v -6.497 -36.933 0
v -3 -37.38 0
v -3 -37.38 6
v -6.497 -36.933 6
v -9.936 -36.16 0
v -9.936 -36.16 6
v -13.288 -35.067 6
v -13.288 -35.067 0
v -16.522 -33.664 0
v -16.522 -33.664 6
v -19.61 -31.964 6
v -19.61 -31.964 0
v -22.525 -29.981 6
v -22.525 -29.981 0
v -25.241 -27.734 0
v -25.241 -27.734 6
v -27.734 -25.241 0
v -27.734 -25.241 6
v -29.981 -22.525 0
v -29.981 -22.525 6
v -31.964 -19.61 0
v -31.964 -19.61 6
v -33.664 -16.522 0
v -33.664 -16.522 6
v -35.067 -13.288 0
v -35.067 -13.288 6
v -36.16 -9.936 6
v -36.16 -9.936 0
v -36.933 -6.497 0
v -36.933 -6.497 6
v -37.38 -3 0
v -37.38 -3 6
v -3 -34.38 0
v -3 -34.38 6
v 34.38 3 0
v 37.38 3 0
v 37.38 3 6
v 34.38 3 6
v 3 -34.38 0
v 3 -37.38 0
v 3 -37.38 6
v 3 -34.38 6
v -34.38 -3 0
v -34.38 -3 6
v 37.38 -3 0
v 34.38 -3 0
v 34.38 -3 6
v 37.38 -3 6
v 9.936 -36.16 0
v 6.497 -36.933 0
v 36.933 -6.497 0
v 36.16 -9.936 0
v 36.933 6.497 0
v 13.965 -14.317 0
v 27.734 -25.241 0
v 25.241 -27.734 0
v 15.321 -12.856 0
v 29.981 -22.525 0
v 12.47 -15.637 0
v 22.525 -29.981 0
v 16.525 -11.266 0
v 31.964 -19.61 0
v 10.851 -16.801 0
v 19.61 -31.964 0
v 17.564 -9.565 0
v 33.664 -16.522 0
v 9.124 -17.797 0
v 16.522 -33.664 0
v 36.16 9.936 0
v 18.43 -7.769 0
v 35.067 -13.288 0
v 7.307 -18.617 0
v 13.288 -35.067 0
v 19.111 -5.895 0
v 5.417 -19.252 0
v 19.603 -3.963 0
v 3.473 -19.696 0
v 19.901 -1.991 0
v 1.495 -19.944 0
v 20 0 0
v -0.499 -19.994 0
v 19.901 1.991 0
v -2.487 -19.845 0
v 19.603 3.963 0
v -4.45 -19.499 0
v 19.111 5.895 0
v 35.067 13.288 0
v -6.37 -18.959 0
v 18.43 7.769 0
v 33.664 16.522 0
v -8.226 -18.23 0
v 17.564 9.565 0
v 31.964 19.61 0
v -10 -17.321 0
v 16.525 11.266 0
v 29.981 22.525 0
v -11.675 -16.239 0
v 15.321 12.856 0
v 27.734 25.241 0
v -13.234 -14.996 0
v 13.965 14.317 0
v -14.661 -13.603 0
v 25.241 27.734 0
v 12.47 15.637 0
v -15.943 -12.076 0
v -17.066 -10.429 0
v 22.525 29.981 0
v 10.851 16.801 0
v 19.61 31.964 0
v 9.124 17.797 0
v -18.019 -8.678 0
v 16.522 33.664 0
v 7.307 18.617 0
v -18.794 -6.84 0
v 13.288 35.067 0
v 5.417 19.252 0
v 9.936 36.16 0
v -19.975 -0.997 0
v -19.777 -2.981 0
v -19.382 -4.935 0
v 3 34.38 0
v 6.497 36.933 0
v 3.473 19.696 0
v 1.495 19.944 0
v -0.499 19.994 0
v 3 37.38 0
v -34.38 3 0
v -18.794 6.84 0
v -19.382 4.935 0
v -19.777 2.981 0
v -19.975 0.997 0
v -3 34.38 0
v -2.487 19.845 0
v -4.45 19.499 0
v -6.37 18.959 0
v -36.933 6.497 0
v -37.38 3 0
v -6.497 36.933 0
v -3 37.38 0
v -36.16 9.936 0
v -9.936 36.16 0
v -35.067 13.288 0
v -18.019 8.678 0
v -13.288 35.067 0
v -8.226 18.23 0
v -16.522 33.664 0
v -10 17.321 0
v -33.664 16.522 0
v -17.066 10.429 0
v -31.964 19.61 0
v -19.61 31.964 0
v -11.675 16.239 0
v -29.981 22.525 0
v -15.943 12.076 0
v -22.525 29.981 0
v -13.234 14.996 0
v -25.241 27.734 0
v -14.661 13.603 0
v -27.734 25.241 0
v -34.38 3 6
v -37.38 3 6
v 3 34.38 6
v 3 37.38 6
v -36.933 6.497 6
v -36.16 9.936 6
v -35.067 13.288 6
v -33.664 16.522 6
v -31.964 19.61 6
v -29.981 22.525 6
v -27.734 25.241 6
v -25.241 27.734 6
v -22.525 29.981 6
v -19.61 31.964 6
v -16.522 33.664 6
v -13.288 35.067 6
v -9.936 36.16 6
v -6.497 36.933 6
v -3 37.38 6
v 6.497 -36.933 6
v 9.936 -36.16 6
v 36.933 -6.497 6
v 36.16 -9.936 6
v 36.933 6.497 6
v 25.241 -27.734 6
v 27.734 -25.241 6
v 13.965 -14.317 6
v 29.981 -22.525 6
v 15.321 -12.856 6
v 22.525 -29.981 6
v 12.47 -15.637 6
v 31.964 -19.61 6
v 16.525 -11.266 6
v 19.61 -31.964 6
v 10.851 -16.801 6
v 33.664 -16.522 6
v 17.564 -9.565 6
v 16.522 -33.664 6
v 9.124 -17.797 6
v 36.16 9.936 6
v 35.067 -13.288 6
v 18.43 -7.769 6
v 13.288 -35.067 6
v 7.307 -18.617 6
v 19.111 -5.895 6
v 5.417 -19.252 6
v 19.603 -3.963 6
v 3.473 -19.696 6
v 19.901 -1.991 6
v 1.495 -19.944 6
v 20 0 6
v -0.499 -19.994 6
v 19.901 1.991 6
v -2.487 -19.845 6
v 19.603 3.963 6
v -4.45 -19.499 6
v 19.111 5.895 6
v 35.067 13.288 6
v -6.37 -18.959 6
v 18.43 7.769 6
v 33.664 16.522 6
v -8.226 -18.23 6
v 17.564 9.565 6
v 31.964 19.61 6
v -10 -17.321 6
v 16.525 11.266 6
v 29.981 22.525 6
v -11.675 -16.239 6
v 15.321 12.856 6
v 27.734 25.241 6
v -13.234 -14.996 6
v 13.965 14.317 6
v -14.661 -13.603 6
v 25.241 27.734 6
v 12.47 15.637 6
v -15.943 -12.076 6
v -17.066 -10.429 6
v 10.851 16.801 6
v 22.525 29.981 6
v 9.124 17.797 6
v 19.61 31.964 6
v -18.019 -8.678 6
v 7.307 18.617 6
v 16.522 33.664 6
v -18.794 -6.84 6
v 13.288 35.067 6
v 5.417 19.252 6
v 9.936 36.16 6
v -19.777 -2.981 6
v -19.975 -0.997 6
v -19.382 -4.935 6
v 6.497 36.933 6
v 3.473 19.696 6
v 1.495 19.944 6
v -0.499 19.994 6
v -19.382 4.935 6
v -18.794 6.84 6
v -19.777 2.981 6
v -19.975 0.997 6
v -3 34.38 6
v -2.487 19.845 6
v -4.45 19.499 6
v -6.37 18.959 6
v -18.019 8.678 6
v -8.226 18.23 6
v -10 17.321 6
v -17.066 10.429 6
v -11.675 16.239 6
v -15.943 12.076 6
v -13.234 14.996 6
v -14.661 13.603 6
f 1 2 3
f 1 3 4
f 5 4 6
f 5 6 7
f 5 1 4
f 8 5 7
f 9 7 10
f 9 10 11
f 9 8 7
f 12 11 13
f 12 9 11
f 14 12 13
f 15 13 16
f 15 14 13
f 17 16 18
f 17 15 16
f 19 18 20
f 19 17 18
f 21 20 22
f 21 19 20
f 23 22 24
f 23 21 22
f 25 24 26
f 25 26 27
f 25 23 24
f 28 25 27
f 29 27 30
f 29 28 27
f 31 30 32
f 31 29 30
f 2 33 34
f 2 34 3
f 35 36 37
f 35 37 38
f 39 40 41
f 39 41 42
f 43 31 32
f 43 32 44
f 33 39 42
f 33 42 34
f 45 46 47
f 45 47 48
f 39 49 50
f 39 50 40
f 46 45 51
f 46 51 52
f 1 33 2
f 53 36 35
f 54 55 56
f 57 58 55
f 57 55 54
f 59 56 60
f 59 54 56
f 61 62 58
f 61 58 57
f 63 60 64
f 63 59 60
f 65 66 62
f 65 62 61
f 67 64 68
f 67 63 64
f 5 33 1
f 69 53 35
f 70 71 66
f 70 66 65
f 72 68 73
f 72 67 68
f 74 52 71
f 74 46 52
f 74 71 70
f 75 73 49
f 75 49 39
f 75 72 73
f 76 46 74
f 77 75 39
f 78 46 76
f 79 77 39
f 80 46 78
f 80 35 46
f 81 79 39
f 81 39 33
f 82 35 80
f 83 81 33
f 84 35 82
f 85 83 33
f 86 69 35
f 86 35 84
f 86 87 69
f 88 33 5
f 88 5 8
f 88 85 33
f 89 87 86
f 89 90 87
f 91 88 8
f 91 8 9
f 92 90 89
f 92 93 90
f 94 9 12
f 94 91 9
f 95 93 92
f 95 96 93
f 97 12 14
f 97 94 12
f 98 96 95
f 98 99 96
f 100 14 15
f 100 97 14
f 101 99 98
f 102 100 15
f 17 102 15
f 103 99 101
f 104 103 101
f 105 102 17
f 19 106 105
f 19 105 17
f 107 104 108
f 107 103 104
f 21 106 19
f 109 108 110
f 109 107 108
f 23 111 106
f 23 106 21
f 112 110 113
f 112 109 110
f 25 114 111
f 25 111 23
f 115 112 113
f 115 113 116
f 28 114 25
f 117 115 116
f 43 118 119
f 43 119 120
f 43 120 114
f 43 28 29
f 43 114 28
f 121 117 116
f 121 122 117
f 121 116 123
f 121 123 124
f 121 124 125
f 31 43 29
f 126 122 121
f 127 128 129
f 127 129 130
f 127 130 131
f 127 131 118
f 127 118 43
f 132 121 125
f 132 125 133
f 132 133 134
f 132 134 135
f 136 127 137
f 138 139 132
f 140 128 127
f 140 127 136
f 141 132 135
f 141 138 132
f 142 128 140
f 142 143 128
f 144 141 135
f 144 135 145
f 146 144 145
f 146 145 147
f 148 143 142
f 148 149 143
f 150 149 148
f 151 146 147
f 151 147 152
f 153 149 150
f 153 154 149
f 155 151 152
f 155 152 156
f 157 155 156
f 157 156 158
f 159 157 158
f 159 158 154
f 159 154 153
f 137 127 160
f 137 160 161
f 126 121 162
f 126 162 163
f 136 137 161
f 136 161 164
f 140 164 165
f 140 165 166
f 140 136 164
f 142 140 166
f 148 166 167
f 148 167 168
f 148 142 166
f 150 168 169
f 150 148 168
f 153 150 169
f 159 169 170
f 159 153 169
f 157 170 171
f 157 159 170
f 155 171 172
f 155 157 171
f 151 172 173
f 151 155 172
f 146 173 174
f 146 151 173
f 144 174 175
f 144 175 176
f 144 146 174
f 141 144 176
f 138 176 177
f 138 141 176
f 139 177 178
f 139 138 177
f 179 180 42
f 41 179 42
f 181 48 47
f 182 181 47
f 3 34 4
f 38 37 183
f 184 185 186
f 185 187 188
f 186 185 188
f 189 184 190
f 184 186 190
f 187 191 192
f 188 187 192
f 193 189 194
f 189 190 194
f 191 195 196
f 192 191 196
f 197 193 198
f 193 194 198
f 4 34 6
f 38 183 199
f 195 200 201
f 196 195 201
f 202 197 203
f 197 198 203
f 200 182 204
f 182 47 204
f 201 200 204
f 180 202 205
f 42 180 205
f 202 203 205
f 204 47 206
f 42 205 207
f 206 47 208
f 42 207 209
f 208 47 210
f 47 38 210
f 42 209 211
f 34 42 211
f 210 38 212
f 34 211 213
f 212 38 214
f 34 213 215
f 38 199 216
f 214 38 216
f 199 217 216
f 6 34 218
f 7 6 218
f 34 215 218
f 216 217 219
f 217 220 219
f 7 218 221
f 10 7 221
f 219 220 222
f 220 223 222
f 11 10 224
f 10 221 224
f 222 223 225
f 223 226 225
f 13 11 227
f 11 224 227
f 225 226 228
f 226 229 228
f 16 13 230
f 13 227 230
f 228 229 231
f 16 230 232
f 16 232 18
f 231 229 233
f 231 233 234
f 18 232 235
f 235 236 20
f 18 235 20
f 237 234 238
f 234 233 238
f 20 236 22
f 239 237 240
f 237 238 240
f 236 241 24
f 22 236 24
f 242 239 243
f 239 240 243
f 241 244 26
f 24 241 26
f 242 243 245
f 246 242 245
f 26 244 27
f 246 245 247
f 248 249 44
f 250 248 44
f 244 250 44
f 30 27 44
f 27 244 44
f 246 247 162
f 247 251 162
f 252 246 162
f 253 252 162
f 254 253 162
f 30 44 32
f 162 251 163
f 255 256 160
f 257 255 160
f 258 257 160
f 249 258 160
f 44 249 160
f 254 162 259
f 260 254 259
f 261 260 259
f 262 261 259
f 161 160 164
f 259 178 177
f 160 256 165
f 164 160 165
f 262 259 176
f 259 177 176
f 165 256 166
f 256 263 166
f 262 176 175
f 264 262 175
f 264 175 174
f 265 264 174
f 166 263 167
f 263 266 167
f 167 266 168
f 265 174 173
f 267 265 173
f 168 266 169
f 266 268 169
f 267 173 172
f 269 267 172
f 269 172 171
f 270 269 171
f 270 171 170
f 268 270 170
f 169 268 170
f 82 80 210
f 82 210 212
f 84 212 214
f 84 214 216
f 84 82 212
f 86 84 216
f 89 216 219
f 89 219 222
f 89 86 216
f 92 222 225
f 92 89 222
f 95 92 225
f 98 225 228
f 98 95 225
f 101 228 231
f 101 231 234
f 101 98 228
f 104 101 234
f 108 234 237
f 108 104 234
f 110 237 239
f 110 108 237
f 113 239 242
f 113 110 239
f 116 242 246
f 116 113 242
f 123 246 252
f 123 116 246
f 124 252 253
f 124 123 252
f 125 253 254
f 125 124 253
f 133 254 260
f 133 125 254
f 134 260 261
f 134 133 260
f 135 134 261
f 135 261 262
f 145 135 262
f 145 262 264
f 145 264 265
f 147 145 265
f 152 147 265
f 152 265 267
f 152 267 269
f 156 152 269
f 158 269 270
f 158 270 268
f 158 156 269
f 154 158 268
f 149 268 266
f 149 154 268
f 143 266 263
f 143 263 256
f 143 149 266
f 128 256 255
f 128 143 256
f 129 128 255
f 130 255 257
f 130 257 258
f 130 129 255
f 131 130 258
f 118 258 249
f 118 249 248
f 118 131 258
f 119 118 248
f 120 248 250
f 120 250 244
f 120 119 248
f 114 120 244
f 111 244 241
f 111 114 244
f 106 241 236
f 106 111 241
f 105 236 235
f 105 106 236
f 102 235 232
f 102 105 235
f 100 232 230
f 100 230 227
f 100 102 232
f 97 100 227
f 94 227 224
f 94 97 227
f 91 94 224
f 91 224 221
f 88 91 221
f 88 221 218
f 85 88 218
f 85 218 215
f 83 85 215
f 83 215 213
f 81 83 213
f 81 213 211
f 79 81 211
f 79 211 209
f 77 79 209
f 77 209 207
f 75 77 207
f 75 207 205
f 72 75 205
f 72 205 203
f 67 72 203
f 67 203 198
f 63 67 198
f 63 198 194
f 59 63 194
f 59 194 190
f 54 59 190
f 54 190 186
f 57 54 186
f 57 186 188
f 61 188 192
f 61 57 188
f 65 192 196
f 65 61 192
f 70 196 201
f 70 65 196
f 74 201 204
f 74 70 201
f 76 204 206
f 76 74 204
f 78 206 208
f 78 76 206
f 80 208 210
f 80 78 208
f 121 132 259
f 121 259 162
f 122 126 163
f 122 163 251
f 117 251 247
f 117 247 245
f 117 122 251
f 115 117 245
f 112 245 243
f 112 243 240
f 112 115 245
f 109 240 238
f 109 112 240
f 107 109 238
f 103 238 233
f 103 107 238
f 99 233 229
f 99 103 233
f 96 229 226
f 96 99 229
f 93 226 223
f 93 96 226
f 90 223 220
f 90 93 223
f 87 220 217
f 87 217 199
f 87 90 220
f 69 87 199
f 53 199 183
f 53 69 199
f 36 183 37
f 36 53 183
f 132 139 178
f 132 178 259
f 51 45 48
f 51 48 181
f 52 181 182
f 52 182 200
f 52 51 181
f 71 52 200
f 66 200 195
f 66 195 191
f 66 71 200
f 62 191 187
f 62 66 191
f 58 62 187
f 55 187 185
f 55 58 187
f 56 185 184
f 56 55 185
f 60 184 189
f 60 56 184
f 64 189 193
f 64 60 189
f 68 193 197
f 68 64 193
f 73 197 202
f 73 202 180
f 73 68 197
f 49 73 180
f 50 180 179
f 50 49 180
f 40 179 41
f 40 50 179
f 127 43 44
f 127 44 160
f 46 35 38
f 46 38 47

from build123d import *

# Parameters (mm, degrees)
SKETCH_1_R      = 20
EXTRUDE_1_DEPTH = 6


with BuildPart() as part:
    # 草图1 → 拉伸1 (new body)
    with BuildSketch(Plane.XY):
        with BuildLine():
            Line((34.379807383, -3), (37.379807383, -3))
            ThreePointArc((37.379807383, -3), (26.516504294, -26.516504294), (3, -37.379807383))
            Line((3, -37.379807383), (3, -34.379807383))
            Line((3, -34.379807383), (-3, -34.379807383))
            Line((-3, -34.379807383), (-3, -37.379807383))
            ThreePointArc((-3, -37.379807383), (-26.516504294, -26.516504294), (-37.379807383, -3))
            Line((-37.379807383, -3), (-34.379807383, -3))
            Line((-34.379807383, -3), (-34.379807383, 3))
            Line((-34.379807383, 3), (-37.379807383, 3))
            ThreePointArc((-37.379807383, 3), (-26.516504294, 26.516504294), (-3, 37.379807383))
            Line((-3, 37.379807383), (-3, 34.379807383))
            Line((-3, 34.379807383), (3, 34.379807383))
            Line((3, 34.379807383), (3, 37.379807383))
            ThreePointArc((3, 37.379807383), (26.516504294, 26.516504294), (37.379807383, 3))
            Line((37.379807383, 3), (34.379807383, 3))
            Line((34.379807383, 3), (34.379807383, -3))
        make_face()
        Circle(SKETCH_1_R, mode=Mode.SUBTRACT)
    extrude(amount=EXTRUDE_1_DEPTH)


solid = part.part
